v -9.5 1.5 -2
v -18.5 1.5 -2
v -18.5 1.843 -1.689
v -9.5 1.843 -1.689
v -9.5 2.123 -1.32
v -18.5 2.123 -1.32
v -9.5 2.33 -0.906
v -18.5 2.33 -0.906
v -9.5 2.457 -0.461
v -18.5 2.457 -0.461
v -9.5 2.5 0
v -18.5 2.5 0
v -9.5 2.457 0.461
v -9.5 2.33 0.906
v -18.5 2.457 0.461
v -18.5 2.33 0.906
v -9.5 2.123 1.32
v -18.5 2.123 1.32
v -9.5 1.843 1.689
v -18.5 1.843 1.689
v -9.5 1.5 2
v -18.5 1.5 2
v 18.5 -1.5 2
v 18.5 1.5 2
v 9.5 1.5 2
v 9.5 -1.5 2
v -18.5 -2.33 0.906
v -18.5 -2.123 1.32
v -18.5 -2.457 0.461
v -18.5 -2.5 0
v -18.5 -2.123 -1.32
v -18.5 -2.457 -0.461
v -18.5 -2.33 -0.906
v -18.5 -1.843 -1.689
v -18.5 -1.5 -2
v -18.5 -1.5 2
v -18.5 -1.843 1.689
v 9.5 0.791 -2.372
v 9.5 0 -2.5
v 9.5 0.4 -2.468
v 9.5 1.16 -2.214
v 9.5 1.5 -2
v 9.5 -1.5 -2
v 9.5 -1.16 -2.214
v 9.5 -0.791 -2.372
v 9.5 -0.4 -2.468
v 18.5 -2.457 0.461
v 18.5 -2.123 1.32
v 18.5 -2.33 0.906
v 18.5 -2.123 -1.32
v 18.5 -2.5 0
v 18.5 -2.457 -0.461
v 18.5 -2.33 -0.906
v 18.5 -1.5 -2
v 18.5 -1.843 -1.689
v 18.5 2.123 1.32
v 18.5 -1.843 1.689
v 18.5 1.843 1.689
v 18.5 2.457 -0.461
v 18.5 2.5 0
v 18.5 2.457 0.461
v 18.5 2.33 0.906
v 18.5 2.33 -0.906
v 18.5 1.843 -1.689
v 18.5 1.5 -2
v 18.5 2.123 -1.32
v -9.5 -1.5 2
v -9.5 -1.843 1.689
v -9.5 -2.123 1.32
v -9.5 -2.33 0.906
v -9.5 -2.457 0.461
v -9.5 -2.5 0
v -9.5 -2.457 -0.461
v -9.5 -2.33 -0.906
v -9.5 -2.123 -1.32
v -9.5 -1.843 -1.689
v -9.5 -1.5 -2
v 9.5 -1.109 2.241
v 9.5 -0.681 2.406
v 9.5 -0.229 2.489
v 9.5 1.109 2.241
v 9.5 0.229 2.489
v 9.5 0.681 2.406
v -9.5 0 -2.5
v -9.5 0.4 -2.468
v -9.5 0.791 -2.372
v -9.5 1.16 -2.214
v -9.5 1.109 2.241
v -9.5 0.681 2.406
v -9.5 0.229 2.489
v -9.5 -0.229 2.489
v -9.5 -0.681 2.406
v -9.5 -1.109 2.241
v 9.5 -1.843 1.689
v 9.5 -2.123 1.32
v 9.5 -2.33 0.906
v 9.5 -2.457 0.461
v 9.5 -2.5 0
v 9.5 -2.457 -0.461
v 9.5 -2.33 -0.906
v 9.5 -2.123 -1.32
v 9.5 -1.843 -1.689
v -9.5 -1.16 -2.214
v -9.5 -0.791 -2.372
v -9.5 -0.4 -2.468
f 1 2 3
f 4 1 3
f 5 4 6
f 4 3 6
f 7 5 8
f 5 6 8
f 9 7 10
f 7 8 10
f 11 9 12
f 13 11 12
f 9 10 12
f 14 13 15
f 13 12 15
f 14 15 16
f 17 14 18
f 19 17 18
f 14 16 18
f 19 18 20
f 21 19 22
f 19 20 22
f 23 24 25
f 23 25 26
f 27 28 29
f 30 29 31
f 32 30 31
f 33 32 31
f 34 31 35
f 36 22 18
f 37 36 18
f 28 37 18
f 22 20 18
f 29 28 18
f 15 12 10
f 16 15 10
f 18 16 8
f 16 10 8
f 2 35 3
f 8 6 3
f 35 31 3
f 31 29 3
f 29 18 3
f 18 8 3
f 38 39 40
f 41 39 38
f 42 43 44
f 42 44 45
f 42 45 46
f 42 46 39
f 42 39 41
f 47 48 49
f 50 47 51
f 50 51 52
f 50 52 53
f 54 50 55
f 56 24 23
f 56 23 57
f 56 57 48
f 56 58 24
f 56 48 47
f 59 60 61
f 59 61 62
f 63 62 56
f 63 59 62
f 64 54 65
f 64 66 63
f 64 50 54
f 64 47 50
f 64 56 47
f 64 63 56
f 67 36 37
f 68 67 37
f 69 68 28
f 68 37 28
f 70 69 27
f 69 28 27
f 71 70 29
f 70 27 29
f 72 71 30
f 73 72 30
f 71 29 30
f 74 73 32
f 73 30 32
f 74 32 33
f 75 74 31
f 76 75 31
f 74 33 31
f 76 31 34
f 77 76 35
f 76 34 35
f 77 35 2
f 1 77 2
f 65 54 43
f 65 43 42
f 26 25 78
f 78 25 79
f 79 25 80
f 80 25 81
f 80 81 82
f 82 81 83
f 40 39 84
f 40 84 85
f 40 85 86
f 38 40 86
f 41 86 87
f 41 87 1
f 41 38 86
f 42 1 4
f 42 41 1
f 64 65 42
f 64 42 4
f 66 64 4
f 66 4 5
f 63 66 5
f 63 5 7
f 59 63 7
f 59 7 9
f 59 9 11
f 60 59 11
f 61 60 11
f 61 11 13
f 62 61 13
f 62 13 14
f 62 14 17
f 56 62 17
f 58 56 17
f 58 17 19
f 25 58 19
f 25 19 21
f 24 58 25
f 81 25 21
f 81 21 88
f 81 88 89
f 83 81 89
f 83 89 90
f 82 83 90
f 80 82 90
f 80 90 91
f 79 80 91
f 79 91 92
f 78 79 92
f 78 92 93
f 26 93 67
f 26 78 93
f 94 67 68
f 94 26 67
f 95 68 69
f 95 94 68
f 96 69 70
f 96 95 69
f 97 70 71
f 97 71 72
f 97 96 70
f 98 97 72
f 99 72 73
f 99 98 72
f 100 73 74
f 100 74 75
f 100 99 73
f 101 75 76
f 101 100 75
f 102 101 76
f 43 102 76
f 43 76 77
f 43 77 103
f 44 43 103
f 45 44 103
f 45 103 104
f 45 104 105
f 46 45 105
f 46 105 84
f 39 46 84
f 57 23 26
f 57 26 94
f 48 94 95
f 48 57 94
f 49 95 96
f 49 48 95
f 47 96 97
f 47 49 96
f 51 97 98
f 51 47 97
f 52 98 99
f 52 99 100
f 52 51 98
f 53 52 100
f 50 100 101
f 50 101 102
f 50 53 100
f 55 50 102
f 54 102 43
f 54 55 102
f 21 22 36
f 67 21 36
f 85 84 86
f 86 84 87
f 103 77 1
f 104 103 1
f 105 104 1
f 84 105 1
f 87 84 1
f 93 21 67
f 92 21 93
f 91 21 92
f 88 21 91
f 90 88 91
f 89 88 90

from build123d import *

# Parameters (mm, degrees)
SKETCH1_R           = 2.5
BOSS_EXTRUDE1_DEPTH = 9.5
BOSS_EXTRUDE2_START = 9
BOSS_EXTRUDE2_DEPTH = 9


with BuildPart() as part:
    # Sketch1 → Boss-Extrude1 (new, symmetric)
    with BuildSketch(Plane(origin=(0, 0, 0), x_dir=(0, 0, -1), z_dir=(1, 0, 0))):
        Circle(SKETCH1_R)
    extrude(amount=BOSS_EXTRUDE1_DEPTH, both=True)

    # Sketch2 → Boss-Extrude2 (add)
    with BuildSketch(Plane(origin=(9.5, 0, 0), x_dir=(0, 0, -1), z_dir=(1, 0, 0)).offset(BOSS_EXTRUDE2_START)):
        with BuildLine():
            Line((-2, 1.5), (-2, -1.5))
            ThreePointArc((-2, -1.5), (0, -2.5), (2, -1.5))
            Line((2, -1.5), (2, 1.5))
            ThreePointArc((2, 1.5), (0, 2.5), (-2, 1.5))
        make_face()
    boss_extrude2 = extrude(amount=-BOSS_EXTRUDE2_DEPTH)

    # Mirror1: Boss-Extrude2 across plane
    add(boss_extrude2.mirror(Plane(origin=(0, 0, 0), x_dir=(0, 0, 1), z_dir=(1, 0, 0))))


solid = part.part
